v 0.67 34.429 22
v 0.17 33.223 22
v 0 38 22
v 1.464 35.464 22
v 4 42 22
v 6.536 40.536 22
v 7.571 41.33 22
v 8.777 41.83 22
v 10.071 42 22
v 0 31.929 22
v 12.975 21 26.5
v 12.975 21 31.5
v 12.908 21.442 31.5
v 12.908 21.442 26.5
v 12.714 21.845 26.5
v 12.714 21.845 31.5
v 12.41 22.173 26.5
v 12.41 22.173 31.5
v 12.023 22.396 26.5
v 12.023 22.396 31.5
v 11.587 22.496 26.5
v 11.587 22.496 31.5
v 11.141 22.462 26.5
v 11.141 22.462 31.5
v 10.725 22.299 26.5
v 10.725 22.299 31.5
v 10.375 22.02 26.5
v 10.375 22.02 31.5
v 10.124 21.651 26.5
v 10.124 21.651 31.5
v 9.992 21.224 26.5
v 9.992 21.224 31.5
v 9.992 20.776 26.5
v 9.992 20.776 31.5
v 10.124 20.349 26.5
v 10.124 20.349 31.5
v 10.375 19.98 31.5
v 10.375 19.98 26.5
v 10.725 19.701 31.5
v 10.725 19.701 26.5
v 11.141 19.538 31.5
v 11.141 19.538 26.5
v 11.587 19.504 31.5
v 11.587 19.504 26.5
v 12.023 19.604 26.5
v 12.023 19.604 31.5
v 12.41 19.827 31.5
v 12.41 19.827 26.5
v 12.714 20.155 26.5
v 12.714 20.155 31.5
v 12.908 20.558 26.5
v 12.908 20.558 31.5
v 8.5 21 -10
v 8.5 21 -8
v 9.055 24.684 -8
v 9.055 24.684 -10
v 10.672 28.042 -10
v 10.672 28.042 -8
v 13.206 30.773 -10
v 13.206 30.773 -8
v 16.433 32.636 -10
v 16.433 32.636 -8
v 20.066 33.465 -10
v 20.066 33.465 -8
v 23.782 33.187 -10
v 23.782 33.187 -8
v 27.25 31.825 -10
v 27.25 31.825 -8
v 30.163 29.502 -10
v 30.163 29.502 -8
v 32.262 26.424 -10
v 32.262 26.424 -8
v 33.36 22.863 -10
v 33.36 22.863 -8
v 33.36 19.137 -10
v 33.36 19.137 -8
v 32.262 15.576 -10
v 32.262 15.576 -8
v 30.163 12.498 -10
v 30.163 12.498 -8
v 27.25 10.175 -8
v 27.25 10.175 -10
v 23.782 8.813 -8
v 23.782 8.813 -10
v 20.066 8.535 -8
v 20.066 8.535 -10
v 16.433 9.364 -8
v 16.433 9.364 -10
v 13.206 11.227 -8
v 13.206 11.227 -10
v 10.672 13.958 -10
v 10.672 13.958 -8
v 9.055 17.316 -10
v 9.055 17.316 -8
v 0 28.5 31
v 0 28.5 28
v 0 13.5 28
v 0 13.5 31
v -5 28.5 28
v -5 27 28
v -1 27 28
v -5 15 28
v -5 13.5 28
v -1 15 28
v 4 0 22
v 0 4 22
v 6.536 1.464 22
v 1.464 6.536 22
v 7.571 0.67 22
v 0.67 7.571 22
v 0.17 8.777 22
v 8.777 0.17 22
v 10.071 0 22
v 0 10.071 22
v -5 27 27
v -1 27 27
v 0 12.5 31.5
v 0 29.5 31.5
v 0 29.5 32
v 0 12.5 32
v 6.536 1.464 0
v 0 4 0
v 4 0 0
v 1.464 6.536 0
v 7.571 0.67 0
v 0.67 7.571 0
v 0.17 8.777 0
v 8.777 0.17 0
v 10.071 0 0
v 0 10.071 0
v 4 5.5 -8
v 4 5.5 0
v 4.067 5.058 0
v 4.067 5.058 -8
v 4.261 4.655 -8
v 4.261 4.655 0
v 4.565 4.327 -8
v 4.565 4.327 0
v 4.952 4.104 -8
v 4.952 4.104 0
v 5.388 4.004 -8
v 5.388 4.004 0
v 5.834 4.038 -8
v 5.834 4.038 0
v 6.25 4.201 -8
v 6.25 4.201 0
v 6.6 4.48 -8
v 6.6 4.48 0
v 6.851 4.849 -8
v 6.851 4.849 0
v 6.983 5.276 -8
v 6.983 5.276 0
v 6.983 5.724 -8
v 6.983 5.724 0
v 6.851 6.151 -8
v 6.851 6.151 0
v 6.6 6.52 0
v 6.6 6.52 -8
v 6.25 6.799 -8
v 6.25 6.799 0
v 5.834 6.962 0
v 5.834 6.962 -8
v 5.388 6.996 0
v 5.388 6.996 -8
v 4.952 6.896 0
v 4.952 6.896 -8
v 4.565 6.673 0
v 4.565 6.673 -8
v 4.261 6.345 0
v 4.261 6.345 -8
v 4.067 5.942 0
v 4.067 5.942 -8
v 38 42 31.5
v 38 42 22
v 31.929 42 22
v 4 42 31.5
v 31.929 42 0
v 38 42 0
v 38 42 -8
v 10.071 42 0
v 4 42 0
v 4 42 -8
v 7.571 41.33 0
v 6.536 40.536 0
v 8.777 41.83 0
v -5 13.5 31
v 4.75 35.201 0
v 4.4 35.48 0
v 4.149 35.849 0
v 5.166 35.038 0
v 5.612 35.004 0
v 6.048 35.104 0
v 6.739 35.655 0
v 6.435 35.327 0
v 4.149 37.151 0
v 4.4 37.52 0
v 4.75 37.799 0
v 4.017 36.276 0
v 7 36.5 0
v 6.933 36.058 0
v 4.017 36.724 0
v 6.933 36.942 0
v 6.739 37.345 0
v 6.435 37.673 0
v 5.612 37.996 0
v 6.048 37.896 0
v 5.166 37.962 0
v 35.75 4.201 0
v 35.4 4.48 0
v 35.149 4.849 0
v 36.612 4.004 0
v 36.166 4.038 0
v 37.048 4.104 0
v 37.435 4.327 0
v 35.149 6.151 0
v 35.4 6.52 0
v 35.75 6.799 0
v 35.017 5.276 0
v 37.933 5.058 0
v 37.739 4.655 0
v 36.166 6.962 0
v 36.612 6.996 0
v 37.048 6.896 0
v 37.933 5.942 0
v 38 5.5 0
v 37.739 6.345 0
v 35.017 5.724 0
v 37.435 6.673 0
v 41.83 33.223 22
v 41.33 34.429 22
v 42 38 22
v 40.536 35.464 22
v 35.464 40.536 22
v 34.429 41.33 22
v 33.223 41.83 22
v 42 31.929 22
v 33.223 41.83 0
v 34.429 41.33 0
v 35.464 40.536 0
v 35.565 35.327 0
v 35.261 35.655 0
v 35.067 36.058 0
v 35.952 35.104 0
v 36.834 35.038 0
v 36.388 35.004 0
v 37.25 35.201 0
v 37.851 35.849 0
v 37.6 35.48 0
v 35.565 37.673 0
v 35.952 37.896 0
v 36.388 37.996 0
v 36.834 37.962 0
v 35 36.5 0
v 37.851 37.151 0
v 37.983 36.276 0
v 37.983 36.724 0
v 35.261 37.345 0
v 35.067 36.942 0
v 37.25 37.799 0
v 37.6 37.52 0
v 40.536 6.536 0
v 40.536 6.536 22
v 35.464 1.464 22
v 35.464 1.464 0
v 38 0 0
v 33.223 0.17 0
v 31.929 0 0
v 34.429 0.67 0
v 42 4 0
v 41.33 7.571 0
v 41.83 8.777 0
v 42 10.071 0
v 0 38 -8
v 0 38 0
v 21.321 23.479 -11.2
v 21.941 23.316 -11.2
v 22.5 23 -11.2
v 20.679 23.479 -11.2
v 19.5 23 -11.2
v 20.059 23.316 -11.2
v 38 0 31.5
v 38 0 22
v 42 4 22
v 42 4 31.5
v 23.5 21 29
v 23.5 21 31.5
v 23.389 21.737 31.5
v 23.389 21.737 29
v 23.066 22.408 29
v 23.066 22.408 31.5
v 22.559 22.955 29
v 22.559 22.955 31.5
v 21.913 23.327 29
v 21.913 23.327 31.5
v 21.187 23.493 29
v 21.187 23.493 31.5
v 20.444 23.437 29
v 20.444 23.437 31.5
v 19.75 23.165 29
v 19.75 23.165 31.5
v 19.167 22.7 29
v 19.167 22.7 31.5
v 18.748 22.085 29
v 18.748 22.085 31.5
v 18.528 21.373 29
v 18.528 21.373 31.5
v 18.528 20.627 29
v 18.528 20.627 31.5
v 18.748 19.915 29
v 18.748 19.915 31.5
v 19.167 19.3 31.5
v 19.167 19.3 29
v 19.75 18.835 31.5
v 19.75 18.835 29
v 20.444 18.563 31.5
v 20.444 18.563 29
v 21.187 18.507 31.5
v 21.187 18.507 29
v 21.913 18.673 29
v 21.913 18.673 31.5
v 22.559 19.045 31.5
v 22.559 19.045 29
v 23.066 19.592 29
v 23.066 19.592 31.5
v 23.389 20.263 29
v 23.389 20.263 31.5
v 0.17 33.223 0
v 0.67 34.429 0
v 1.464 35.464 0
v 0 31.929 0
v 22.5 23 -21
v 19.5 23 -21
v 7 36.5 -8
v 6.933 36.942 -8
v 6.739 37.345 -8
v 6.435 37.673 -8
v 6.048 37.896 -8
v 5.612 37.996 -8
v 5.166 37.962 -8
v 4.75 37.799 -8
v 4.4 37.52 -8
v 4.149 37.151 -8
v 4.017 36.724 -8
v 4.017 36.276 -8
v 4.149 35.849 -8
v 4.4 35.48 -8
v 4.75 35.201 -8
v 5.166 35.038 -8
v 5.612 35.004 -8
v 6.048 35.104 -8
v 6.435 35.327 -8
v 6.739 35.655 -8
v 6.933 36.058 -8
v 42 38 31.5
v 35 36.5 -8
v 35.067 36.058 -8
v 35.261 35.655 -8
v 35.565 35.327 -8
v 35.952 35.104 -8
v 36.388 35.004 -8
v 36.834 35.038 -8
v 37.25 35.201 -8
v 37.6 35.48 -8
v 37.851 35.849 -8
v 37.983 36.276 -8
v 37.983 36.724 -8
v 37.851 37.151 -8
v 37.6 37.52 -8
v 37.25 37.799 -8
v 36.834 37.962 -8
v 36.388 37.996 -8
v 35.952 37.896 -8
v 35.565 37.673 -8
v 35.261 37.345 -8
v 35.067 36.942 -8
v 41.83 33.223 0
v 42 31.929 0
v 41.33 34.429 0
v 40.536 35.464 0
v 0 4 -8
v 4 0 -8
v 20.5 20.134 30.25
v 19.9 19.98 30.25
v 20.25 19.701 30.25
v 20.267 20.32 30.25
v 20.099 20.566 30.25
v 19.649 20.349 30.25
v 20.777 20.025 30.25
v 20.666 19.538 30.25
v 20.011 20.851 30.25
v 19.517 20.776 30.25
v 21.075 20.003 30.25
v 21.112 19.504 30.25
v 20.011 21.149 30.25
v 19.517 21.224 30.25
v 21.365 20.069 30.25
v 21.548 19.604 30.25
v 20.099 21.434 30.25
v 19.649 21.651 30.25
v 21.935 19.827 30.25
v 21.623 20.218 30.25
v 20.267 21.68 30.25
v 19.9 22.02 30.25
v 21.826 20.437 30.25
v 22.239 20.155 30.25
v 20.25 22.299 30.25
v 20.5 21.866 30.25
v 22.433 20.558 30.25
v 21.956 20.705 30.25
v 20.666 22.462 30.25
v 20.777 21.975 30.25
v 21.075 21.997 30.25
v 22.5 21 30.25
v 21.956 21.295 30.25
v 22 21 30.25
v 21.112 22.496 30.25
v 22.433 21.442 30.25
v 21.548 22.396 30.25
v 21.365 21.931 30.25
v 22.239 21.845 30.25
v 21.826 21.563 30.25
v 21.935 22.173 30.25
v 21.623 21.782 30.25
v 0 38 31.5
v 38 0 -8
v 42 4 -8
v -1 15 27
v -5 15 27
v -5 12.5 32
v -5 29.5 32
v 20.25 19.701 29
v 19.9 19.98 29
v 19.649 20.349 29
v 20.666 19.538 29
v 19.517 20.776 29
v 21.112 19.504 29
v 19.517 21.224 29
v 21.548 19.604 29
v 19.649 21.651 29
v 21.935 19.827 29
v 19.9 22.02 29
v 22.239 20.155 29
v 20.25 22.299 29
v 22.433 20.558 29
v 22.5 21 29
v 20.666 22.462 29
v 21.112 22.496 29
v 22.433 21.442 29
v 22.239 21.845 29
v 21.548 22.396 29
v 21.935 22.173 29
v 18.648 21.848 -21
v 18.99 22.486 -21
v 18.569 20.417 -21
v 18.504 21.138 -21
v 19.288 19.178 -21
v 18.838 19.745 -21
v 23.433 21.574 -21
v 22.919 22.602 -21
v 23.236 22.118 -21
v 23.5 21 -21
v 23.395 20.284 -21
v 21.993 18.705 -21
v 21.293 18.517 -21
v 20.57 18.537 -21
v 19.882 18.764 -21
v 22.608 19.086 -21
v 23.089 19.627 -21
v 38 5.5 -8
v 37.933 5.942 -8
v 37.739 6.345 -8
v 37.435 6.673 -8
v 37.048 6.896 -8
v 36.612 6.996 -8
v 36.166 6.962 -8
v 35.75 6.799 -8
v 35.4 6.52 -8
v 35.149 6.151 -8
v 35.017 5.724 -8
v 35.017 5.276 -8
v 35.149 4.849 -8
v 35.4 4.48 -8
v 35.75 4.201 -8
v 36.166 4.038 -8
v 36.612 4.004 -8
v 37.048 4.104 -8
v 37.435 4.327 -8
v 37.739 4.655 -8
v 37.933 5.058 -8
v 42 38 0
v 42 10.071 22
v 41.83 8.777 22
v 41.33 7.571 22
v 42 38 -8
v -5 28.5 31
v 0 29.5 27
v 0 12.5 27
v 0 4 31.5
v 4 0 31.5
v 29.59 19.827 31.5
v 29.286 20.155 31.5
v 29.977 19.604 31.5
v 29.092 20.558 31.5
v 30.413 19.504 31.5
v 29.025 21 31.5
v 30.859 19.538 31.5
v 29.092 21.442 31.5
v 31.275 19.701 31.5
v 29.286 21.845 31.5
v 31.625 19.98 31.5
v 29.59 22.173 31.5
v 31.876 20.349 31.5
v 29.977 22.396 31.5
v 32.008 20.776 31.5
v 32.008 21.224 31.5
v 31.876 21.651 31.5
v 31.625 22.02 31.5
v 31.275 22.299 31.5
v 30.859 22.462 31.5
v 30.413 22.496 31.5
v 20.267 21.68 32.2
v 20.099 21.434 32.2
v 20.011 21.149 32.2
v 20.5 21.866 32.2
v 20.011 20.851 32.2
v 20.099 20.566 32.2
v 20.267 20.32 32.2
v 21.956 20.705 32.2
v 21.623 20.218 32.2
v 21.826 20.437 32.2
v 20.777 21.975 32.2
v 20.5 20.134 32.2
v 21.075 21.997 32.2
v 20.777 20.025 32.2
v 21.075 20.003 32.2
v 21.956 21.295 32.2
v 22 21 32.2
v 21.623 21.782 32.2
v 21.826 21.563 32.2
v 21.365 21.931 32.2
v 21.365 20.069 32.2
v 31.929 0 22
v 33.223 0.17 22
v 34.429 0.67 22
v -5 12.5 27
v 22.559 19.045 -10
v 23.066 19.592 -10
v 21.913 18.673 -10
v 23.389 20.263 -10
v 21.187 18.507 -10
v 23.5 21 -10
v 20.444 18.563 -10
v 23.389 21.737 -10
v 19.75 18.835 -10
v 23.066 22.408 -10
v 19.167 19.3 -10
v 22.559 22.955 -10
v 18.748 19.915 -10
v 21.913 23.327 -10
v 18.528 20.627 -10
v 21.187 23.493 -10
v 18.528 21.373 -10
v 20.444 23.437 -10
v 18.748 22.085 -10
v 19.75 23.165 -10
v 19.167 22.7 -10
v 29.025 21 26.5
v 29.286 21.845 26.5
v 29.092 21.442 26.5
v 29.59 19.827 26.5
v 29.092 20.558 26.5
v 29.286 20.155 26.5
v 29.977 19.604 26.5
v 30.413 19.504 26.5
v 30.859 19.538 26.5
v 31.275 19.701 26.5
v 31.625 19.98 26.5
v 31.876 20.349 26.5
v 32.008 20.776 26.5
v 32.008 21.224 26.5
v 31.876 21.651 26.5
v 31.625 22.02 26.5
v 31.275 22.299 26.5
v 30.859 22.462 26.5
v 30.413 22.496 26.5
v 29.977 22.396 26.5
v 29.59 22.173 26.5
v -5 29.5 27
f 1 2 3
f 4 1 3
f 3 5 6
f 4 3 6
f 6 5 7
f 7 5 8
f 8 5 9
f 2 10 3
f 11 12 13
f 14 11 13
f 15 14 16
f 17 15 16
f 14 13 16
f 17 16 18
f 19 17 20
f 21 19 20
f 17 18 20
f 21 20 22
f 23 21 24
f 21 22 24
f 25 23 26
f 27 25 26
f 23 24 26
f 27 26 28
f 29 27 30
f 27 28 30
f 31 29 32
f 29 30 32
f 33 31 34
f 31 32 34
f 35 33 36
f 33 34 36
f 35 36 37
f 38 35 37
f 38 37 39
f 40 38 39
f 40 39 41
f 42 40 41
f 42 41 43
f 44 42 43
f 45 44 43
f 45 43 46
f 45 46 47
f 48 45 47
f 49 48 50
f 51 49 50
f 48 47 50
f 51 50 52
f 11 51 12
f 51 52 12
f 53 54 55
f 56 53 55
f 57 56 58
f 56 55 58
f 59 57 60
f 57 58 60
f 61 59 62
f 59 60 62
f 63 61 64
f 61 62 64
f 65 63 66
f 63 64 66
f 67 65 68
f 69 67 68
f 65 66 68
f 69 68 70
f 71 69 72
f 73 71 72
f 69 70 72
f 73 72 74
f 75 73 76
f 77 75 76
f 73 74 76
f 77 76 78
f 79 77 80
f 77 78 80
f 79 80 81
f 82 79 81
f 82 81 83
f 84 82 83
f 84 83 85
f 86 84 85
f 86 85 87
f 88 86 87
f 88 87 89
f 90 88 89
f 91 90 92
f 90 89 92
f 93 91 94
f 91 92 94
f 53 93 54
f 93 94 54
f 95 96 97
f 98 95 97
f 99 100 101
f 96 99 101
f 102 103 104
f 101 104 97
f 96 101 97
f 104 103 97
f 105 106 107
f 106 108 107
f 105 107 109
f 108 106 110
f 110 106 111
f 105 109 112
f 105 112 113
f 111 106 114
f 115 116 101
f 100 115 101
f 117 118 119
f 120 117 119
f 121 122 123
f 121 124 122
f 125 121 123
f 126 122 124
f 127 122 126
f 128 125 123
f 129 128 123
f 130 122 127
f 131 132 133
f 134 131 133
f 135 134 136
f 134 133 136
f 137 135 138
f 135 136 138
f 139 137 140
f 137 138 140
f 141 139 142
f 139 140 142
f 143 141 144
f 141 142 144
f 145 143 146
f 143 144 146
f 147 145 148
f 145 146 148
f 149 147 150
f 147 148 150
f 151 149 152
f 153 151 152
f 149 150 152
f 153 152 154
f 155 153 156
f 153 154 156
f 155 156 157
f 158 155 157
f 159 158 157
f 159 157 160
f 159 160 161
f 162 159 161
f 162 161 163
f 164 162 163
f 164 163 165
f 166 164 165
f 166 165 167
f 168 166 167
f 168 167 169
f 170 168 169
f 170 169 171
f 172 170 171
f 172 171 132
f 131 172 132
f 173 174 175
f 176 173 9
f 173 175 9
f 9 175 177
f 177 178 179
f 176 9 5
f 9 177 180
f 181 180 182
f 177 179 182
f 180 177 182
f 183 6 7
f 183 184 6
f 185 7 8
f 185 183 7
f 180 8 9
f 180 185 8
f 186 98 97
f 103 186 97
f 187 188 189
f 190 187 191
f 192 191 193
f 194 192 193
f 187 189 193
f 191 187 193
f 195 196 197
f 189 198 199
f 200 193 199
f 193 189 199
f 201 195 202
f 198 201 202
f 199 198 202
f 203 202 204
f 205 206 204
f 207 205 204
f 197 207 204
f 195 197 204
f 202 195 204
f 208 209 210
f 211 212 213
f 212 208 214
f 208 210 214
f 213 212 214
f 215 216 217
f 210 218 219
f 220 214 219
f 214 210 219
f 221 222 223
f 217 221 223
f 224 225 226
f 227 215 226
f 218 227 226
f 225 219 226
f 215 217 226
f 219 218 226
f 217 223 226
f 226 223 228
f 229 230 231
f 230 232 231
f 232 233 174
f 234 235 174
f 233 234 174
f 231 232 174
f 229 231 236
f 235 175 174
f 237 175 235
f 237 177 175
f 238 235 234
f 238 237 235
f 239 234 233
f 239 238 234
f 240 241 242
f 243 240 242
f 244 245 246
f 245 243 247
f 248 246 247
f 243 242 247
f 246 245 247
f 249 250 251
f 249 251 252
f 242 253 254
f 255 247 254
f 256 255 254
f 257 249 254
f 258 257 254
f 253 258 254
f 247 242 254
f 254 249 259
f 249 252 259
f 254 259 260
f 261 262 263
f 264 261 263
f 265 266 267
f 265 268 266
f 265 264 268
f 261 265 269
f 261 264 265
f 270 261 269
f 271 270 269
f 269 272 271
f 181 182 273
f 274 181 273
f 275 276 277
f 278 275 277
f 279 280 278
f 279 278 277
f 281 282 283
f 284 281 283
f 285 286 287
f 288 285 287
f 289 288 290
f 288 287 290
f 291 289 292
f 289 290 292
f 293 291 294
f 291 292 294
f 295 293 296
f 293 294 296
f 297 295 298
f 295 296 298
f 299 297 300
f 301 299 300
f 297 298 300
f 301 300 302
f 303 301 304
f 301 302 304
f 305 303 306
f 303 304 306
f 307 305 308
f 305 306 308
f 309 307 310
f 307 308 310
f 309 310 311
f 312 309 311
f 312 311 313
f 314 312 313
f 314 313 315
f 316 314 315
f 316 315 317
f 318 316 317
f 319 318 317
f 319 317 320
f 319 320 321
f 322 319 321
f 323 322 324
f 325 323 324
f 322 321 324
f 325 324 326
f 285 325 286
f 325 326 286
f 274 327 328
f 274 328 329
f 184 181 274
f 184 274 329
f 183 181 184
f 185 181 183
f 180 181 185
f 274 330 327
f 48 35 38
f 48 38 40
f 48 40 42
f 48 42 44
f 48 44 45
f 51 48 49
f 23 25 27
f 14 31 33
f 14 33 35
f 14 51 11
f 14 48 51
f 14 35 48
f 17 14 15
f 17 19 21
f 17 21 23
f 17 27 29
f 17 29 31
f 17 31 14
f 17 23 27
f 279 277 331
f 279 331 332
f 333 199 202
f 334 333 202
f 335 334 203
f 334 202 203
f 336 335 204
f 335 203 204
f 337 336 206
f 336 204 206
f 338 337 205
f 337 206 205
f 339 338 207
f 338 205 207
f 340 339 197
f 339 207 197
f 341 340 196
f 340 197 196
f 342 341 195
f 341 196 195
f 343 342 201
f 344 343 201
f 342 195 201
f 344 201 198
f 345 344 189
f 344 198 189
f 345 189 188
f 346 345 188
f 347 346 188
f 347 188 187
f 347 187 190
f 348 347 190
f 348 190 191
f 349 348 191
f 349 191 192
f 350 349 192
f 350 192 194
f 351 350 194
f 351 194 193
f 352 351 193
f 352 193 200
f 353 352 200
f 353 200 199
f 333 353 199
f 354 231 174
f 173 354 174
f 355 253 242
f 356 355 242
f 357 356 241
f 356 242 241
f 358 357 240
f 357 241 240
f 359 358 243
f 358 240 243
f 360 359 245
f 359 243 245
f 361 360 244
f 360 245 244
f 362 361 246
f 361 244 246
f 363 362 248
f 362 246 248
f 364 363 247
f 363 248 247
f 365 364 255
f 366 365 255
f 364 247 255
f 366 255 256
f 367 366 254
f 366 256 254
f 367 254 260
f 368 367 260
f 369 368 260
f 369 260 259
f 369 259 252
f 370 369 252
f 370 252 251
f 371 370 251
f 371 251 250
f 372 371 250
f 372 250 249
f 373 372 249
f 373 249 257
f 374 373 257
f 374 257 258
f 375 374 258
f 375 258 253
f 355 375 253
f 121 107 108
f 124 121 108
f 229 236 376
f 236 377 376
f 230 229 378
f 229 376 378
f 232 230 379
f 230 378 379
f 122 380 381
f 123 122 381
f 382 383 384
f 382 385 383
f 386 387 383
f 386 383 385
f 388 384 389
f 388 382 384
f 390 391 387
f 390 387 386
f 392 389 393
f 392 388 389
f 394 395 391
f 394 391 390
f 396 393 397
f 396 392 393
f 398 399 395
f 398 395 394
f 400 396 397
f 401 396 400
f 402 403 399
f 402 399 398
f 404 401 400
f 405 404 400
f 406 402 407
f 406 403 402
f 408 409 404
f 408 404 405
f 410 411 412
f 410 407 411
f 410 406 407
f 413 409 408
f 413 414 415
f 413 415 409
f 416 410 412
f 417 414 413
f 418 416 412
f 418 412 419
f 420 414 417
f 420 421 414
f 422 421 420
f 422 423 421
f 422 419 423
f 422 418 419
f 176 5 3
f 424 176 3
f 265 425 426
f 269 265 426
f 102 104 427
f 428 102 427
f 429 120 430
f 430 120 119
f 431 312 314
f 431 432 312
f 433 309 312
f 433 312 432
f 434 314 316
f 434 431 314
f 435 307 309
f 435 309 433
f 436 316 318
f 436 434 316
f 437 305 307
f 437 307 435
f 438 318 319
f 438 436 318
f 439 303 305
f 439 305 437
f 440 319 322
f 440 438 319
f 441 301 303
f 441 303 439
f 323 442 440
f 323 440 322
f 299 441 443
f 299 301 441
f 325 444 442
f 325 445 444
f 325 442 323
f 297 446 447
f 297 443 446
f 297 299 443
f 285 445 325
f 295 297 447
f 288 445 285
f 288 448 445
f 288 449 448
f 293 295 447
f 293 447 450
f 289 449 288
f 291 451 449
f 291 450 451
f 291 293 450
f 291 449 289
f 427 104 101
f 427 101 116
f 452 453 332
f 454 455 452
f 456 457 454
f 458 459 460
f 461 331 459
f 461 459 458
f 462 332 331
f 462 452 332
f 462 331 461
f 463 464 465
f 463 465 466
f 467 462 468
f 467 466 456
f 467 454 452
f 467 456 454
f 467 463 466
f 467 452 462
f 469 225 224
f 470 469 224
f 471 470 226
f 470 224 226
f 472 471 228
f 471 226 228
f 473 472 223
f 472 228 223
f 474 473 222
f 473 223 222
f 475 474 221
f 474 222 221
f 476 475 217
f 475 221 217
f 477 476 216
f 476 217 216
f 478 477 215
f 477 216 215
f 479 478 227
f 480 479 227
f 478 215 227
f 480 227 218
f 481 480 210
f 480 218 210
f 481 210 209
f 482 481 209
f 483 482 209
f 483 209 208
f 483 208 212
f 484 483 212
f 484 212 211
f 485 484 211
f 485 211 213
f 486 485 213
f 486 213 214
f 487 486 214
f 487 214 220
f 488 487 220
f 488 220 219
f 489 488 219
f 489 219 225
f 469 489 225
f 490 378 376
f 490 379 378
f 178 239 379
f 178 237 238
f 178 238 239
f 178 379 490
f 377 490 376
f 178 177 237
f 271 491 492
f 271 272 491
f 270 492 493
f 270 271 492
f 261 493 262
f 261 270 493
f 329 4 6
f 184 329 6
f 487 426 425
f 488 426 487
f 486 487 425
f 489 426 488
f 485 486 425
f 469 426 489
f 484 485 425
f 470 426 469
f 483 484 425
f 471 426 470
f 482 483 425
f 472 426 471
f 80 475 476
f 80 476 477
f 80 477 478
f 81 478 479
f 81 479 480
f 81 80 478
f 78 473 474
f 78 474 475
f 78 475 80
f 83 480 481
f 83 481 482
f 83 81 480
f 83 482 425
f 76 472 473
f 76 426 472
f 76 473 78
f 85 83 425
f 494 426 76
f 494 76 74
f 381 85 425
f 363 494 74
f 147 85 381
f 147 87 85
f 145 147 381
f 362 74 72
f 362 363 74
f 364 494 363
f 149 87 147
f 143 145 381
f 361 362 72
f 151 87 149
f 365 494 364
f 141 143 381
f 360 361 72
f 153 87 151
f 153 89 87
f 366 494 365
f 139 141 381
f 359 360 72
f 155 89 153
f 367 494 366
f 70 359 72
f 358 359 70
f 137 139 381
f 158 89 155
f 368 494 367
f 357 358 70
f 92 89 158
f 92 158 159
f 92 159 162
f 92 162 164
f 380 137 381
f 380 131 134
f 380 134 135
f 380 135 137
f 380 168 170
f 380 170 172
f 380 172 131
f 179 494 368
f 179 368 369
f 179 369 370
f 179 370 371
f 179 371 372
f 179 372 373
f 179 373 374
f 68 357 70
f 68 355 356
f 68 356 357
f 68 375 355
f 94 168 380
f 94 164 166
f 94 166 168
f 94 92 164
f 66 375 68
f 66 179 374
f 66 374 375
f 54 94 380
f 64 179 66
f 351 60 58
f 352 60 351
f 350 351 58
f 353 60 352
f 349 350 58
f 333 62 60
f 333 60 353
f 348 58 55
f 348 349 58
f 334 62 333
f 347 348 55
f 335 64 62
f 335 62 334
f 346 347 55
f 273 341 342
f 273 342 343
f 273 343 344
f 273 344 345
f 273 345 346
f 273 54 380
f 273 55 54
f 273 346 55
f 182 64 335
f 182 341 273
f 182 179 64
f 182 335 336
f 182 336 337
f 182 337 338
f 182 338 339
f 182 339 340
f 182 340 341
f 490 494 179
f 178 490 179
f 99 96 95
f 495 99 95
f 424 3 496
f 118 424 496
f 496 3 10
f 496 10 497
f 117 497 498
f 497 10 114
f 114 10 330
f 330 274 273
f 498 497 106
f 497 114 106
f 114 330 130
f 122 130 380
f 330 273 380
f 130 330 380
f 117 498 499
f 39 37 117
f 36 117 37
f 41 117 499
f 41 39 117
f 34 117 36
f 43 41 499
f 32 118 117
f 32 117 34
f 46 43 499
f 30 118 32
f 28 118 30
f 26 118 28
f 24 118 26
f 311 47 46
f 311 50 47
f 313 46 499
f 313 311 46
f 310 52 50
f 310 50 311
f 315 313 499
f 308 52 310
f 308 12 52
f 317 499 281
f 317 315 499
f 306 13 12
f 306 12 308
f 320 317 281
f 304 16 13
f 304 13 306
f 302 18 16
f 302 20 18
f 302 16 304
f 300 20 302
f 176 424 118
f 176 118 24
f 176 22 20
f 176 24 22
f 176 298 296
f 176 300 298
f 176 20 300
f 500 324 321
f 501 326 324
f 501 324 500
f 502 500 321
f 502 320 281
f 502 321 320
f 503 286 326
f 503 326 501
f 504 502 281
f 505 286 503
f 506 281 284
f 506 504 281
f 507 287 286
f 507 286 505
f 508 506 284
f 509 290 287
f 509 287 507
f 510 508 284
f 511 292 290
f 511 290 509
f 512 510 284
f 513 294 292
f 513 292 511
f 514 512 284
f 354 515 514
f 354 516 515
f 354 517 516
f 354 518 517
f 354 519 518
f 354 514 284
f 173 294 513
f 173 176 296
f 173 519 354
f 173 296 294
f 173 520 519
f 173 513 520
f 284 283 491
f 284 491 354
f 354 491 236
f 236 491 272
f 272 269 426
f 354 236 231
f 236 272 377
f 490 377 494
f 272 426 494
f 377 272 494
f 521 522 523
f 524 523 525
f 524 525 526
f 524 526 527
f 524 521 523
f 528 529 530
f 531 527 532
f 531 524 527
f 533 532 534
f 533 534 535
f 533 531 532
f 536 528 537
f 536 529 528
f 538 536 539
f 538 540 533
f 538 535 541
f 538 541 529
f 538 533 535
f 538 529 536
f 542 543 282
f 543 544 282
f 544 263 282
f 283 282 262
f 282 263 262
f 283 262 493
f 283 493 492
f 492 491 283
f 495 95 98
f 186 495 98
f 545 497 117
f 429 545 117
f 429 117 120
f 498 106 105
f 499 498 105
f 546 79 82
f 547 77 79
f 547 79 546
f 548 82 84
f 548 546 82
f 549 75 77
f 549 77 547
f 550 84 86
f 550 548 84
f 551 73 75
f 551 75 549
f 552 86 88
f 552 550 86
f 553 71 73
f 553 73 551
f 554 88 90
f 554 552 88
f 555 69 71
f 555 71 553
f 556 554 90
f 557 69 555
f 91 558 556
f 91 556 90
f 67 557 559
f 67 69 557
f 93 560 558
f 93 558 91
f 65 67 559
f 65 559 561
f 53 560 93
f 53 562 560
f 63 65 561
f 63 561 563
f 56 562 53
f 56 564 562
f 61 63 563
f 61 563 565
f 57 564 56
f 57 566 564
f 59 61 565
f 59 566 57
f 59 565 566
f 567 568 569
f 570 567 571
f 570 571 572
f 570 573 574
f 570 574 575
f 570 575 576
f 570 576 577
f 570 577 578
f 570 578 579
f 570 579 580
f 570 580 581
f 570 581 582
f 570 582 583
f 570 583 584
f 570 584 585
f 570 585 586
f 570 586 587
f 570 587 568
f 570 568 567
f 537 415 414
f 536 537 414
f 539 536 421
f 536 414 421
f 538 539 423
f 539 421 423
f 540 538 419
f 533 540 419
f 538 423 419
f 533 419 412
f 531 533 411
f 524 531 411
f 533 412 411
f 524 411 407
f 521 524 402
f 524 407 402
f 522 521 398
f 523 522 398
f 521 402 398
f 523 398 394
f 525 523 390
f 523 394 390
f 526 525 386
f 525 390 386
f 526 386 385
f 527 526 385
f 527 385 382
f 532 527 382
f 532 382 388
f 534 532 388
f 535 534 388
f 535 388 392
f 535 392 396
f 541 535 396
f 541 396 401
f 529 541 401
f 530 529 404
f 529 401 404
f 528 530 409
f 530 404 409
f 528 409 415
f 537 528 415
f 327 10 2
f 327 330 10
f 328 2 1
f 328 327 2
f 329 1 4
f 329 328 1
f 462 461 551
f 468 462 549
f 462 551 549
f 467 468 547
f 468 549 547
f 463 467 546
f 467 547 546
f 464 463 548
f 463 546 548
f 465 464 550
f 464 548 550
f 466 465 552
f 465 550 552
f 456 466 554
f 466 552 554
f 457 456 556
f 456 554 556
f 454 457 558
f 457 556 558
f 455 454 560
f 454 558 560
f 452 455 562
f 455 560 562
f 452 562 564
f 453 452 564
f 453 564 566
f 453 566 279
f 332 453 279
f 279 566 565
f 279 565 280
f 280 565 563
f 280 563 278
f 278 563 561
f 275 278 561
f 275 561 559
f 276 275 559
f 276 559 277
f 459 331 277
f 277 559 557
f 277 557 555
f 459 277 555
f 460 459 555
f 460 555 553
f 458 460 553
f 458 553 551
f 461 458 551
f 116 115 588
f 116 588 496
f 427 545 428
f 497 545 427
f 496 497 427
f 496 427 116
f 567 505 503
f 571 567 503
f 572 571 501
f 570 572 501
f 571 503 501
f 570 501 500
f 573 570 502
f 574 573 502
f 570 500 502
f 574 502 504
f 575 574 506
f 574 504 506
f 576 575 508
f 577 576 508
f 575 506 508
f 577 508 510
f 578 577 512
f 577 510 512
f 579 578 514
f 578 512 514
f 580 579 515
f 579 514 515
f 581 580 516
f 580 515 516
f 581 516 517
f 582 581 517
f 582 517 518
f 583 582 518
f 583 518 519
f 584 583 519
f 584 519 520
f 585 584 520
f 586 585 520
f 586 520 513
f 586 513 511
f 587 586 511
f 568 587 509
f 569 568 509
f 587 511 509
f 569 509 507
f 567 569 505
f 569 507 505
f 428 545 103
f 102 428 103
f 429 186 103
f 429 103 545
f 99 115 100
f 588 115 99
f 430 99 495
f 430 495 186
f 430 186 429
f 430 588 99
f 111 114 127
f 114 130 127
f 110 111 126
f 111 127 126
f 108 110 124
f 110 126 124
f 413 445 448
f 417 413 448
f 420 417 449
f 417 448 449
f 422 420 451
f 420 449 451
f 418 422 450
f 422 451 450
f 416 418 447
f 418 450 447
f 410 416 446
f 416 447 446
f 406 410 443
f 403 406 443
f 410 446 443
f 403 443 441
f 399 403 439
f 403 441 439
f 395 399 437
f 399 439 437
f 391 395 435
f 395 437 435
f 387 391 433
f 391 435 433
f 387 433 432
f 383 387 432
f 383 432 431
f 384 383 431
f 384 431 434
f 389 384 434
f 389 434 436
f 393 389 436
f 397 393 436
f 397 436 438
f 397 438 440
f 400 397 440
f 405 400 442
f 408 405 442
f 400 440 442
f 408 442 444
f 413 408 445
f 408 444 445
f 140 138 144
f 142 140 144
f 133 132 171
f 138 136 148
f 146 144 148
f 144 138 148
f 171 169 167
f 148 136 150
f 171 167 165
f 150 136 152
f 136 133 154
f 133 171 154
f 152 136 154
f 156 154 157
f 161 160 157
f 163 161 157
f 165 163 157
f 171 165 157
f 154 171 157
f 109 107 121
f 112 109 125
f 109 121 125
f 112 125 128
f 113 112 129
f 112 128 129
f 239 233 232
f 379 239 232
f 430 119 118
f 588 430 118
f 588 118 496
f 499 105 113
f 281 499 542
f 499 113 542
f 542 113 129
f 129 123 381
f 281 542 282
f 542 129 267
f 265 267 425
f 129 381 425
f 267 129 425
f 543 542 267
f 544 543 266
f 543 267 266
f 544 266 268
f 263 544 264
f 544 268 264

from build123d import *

# Parameters (mm, degrees)
EXTRUDE_1_DEPTH          = 8
CUT_EXTRUDE_1_REACH      = 61.933
SKETCH_2_R               = 1.5
EXTRUDE_2_DEPTH          = 22
CUT_EXTRUDE_2_DEPTH      = 22
EXTRUDE_3_DEPTH          = 9.5
SKETCH_8_R               = 1.5
CUT_EXTRUDE_3_DEPTH      = 5
SKETCH_10_R              = 2.5
CUT_EXTRUDE_4_DEPTH      = 2.5
SKETCH_11_R              = 1.5
EXTRUDE_4_DEPTH          = 1.25
SKETCH_12_R              = 1
EXTRUDE_5_DEPTH          = 1.95
FILLET_3_R               = 5
SKETCH_13_R              = 12.5
EXTRUDE_6_DEPTH          = 2
SKETCH_14_R              = 2.5
EXTRUDE_7_DEPTH          = 11
CUT_EXTRUDE_5_DEPTH      = 80.738572849
CUT_EXTRUDE_5_DEPTH_BACK = 9.8
EXTRUDE_6_2_DEPTH        = 5
EXTRUDE_8_REACH          = 61.412
SKETCH_18_W              = 1
SKETCH_18_H              = 1


with BuildPart() as part:
    # 草图1 → 凸台-拉伸1 (new body)
    with BuildSketch(Plane.XY):
        Polygon((0, 38), (4, 42), (38, 42), (42, 38), (42, 4), (38, 0), (4, 0), (0, 4), align=None)
    extrude(amount=-EXTRUDE_1_DEPTH)

    # 草图2 → 切除-拉伸1 (cut, up to next)
    with BuildSketch(Plane.XY, mode=Mode.PRIVATE) as cut_extrude_1_sk1:
        with Locations((5.5, 36.5)):
            Circle(SKETCH_2_R)
    cut_extrude_1_tool1 = extrude(cut_extrude_1_sk1.sketch, amount=-CUT_EXTRUDE_1_REACH, mode=Mode.PRIVATE) & part.part
    # 草图2 → 切除-拉伸1 (cut, up to next)
    with BuildSketch(Plane.XY, mode=Mode.PRIVATE) as cut_extrude_1_sk2:
        with Locations(Location((5.5, 5.5, 0), (0, 0, 180))):
            Circle(SKETCH_2_R)
    cut_extrude_1_tool2 = extrude(cut_extrude_1_sk2.sketch, amount=-CUT_EXTRUDE_1_REACH, mode=Mode.PRIVATE) & part.part
    # 草图2 → 切除-拉伸1 (cut, up to next)
    with BuildSketch(Plane.XY, mode=Mode.PRIVATE) as cut_extrude_1_sk3:
        with Locations(Location((36.5, 36.5, 0), (0, 0, 180))):
            Circle(SKETCH_2_R)
    cut_extrude_1_tool3 = extrude(cut_extrude_1_sk3.sketch, amount=-CUT_EXTRUDE_1_REACH, mode=Mode.PRIVATE) & part.part
    # 草图2 → 切除-拉伸1 (cut, up to next)
    with BuildSketch(Plane.XY, mode=Mode.PRIVATE) as cut_extrude_1_sk4:
        with Locations((36.5, 5.5)):
            Circle(SKETCH_2_R)
    cut_extrude_1_tool4 = extrude(cut_extrude_1_sk4.sketch, amount=-CUT_EXTRUDE_1_REACH, mode=Mode.PRIVATE) & part.part
    add(cut_extrude_1_tool1.solids().sort_by_distance((5.5, 36.5, 0))[0], mode=Mode.SUBTRACT)
    add(cut_extrude_1_tool2.solids().sort_by_distance((5.5, 5.5, 0))[0], mode=Mode.SUBTRACT)
    add(cut_extrude_1_tool3.solids().sort_by_distance((36.5, 36.5, 0))[0], mode=Mode.SUBTRACT)
    add(cut_extrude_1_tool4.solids().sort_by_distance((36.5, 5.5, 0))[0], mode=Mode.SUBTRACT)

    # 草图5 → 凸台-拉伸2 (add)
    with BuildSketch(Plane.XY):
        Polygon((0, 4), (4, 0), (38, 0), (42, 4), (42, 38), (38, 42), (4, 42), (0, 38), align=None)
    extrude(amount=EXTRUDE_2_DEPTH)

    # 草图6 → 切除-拉伸2 (cut)
    with BuildSketch(Plane.XY.offset(22)):
        Polygon((8, 0), (0, 8), (0, 4), (4, 0), align=None)
        Polygon((42, 8), (34, 0), (38, 0), (42, 4), align=None)
        Polygon((38, 42), (34, 42), (42, 34), (42, 38), align=None)
        Polygon((0, 38), (0, 34), (8, 42), (4, 42), align=None)
    extrude(amount=-CUT_EXTRUDE_2_DEPTH, mode=Mode.SUBTRACT)

    # 草图7 → 凸台-拉伸3 (add)
    with BuildSketch(Plane.XY.offset(22)):
        Polygon((0, 38), (0, 4), (4, 0), (38, 0), (42, 4), (42, 38), (38, 42), (4, 42), align=None)
    extrude(amount=EXTRUDE_3_DEPTH)

    # 草图8 → 切除-拉伸3 (cut)
    with BuildSketch(Plane.XY.offset(31.5)):
        with Locations((11.475, 21)):
            Circle(SKETCH_8_R)
        with Locations(Location((30.525, 21, 0), (0, 0, 180))):
            Circle(SKETCH_8_R)
    extrude(amount=-CUT_EXTRUDE_3_DEPTH, mode=Mode.SUBTRACT)

    # 草图10 → 切除-拉伸4 (cut)
    with BuildSketch(Plane.XY.offset(31.5)):
        with Locations((21, 21)):
            Circle(SKETCH_10_R)
    extrude(amount=-CUT_EXTRUDE_4_DEPTH, mode=Mode.SUBTRACT)

    # 草图11 → 凸台-拉伸4 (add)
    with BuildSketch(Plane.XY.offset(29)):
        with Locations((21, 21)):
            Circle(SKETCH_11_R)
    extrude(amount=EXTRUDE_4_DEPTH)

    # 草图12 → 凸台-拉伸5 (add)
    with BuildSketch(Plane.XY.offset(30.25)):
        with Locations((21, 21)):
            Circle(SKETCH_12_R)
    extrude(amount=EXTRUDE_5_DEPTH)

    # 圆角3
    fillet_3_edges = [part.edges().sort_by_distance(p)[0] for p in [
        (42, 8, 11),
        (34, 0, 11),
        (0, 8, 11),
        (8, 0, 11),
        (0, 34, 11),
        (8, 42, 11),
        (42, 34, 11),
        (34, 42, 11),
    ]]
    fillet(fillet_3_edges, radius=FILLET_3_R)

    # 草图13 → Extrude 6 (add)
    with BuildSketch(Plane(origin=(0, 0, -8), x_dir=(-1, 0, 0), z_dir=(0, 0, -1))):
        with Locations((-21, 21)):
            Circle(SKETCH_13_R)
    extrude(amount=EXTRUDE_6_DEPTH)

    # 草图14 → 凸台-拉伸7 (add)
    with BuildSketch(Plane(origin=(0, 0, -10), x_dir=(-1, 0, 0), z_dir=(0, 0, -1))):
        with Locations(Location((-21, 21, 0), (0, 0, 180))):
            Circle(SKETCH_14_R)
    extrude(amount=EXTRUDE_7_DEPTH)

    # 草图16 → 切除-拉伸5 (cut, two sides: drawn at the far end of the back side and taken through both)
    with BuildSketch(Plane(origin=(0, 0, -21), x_dir=(-1, 0, 0), z_dir=(0, 0, -1)).offset(-CUT_EXTRUDE_5_DEPTH_BACK)):
        Polygon((-96.850602173, 23), (-22.5, 23), (-19.5, 23), (54.850602173, 23), (54.850602173, 171.701204346), (-96.850602173, 171.701204346), align=None)
    extrude(amount=CUT_EXTRUDE_5_DEPTH + CUT_EXTRUDE_5_DEPTH_BACK, mode=Mode.SUBTRACT)

    # 草图17 → Extrude 6 2 (add)
    with BuildSketch(Plane.ZY):
        Polygon((27, 15), (27, 12.5), (32, 12.5), (32, 29.5), (27, 29.5), (27, 27), (28, 27), (28, 28.5), (31, 28.5), (31, 13.5), (28, 13.5), (28, 15), align=None)
    extrude(amount=EXTRUDE_6_2_DEPTH)

    # 草图18 → 凸台-拉伸8 (add, up to next)
    with BuildSketch(Plane(origin=(0, 15, 0), x_dir=(1, 0, 0), z_dir=(0, 1, 0)), mode=Mode.PRIVATE) as extrude_8_sk1:
        with Locations((-0.5, -27.5)):
            Rectangle(SKETCH_18_W, SKETCH_18_H)
    extrude_8_tool1 = extrude(extrude_8_sk1.sketch, amount=EXTRUDE_8_REACH, mode=Mode.PRIVATE) - part.part
    add(extrude_8_tool1.solids().sort_by_distance((-0.5, 15, 27.5))[0])


solid = part.part
